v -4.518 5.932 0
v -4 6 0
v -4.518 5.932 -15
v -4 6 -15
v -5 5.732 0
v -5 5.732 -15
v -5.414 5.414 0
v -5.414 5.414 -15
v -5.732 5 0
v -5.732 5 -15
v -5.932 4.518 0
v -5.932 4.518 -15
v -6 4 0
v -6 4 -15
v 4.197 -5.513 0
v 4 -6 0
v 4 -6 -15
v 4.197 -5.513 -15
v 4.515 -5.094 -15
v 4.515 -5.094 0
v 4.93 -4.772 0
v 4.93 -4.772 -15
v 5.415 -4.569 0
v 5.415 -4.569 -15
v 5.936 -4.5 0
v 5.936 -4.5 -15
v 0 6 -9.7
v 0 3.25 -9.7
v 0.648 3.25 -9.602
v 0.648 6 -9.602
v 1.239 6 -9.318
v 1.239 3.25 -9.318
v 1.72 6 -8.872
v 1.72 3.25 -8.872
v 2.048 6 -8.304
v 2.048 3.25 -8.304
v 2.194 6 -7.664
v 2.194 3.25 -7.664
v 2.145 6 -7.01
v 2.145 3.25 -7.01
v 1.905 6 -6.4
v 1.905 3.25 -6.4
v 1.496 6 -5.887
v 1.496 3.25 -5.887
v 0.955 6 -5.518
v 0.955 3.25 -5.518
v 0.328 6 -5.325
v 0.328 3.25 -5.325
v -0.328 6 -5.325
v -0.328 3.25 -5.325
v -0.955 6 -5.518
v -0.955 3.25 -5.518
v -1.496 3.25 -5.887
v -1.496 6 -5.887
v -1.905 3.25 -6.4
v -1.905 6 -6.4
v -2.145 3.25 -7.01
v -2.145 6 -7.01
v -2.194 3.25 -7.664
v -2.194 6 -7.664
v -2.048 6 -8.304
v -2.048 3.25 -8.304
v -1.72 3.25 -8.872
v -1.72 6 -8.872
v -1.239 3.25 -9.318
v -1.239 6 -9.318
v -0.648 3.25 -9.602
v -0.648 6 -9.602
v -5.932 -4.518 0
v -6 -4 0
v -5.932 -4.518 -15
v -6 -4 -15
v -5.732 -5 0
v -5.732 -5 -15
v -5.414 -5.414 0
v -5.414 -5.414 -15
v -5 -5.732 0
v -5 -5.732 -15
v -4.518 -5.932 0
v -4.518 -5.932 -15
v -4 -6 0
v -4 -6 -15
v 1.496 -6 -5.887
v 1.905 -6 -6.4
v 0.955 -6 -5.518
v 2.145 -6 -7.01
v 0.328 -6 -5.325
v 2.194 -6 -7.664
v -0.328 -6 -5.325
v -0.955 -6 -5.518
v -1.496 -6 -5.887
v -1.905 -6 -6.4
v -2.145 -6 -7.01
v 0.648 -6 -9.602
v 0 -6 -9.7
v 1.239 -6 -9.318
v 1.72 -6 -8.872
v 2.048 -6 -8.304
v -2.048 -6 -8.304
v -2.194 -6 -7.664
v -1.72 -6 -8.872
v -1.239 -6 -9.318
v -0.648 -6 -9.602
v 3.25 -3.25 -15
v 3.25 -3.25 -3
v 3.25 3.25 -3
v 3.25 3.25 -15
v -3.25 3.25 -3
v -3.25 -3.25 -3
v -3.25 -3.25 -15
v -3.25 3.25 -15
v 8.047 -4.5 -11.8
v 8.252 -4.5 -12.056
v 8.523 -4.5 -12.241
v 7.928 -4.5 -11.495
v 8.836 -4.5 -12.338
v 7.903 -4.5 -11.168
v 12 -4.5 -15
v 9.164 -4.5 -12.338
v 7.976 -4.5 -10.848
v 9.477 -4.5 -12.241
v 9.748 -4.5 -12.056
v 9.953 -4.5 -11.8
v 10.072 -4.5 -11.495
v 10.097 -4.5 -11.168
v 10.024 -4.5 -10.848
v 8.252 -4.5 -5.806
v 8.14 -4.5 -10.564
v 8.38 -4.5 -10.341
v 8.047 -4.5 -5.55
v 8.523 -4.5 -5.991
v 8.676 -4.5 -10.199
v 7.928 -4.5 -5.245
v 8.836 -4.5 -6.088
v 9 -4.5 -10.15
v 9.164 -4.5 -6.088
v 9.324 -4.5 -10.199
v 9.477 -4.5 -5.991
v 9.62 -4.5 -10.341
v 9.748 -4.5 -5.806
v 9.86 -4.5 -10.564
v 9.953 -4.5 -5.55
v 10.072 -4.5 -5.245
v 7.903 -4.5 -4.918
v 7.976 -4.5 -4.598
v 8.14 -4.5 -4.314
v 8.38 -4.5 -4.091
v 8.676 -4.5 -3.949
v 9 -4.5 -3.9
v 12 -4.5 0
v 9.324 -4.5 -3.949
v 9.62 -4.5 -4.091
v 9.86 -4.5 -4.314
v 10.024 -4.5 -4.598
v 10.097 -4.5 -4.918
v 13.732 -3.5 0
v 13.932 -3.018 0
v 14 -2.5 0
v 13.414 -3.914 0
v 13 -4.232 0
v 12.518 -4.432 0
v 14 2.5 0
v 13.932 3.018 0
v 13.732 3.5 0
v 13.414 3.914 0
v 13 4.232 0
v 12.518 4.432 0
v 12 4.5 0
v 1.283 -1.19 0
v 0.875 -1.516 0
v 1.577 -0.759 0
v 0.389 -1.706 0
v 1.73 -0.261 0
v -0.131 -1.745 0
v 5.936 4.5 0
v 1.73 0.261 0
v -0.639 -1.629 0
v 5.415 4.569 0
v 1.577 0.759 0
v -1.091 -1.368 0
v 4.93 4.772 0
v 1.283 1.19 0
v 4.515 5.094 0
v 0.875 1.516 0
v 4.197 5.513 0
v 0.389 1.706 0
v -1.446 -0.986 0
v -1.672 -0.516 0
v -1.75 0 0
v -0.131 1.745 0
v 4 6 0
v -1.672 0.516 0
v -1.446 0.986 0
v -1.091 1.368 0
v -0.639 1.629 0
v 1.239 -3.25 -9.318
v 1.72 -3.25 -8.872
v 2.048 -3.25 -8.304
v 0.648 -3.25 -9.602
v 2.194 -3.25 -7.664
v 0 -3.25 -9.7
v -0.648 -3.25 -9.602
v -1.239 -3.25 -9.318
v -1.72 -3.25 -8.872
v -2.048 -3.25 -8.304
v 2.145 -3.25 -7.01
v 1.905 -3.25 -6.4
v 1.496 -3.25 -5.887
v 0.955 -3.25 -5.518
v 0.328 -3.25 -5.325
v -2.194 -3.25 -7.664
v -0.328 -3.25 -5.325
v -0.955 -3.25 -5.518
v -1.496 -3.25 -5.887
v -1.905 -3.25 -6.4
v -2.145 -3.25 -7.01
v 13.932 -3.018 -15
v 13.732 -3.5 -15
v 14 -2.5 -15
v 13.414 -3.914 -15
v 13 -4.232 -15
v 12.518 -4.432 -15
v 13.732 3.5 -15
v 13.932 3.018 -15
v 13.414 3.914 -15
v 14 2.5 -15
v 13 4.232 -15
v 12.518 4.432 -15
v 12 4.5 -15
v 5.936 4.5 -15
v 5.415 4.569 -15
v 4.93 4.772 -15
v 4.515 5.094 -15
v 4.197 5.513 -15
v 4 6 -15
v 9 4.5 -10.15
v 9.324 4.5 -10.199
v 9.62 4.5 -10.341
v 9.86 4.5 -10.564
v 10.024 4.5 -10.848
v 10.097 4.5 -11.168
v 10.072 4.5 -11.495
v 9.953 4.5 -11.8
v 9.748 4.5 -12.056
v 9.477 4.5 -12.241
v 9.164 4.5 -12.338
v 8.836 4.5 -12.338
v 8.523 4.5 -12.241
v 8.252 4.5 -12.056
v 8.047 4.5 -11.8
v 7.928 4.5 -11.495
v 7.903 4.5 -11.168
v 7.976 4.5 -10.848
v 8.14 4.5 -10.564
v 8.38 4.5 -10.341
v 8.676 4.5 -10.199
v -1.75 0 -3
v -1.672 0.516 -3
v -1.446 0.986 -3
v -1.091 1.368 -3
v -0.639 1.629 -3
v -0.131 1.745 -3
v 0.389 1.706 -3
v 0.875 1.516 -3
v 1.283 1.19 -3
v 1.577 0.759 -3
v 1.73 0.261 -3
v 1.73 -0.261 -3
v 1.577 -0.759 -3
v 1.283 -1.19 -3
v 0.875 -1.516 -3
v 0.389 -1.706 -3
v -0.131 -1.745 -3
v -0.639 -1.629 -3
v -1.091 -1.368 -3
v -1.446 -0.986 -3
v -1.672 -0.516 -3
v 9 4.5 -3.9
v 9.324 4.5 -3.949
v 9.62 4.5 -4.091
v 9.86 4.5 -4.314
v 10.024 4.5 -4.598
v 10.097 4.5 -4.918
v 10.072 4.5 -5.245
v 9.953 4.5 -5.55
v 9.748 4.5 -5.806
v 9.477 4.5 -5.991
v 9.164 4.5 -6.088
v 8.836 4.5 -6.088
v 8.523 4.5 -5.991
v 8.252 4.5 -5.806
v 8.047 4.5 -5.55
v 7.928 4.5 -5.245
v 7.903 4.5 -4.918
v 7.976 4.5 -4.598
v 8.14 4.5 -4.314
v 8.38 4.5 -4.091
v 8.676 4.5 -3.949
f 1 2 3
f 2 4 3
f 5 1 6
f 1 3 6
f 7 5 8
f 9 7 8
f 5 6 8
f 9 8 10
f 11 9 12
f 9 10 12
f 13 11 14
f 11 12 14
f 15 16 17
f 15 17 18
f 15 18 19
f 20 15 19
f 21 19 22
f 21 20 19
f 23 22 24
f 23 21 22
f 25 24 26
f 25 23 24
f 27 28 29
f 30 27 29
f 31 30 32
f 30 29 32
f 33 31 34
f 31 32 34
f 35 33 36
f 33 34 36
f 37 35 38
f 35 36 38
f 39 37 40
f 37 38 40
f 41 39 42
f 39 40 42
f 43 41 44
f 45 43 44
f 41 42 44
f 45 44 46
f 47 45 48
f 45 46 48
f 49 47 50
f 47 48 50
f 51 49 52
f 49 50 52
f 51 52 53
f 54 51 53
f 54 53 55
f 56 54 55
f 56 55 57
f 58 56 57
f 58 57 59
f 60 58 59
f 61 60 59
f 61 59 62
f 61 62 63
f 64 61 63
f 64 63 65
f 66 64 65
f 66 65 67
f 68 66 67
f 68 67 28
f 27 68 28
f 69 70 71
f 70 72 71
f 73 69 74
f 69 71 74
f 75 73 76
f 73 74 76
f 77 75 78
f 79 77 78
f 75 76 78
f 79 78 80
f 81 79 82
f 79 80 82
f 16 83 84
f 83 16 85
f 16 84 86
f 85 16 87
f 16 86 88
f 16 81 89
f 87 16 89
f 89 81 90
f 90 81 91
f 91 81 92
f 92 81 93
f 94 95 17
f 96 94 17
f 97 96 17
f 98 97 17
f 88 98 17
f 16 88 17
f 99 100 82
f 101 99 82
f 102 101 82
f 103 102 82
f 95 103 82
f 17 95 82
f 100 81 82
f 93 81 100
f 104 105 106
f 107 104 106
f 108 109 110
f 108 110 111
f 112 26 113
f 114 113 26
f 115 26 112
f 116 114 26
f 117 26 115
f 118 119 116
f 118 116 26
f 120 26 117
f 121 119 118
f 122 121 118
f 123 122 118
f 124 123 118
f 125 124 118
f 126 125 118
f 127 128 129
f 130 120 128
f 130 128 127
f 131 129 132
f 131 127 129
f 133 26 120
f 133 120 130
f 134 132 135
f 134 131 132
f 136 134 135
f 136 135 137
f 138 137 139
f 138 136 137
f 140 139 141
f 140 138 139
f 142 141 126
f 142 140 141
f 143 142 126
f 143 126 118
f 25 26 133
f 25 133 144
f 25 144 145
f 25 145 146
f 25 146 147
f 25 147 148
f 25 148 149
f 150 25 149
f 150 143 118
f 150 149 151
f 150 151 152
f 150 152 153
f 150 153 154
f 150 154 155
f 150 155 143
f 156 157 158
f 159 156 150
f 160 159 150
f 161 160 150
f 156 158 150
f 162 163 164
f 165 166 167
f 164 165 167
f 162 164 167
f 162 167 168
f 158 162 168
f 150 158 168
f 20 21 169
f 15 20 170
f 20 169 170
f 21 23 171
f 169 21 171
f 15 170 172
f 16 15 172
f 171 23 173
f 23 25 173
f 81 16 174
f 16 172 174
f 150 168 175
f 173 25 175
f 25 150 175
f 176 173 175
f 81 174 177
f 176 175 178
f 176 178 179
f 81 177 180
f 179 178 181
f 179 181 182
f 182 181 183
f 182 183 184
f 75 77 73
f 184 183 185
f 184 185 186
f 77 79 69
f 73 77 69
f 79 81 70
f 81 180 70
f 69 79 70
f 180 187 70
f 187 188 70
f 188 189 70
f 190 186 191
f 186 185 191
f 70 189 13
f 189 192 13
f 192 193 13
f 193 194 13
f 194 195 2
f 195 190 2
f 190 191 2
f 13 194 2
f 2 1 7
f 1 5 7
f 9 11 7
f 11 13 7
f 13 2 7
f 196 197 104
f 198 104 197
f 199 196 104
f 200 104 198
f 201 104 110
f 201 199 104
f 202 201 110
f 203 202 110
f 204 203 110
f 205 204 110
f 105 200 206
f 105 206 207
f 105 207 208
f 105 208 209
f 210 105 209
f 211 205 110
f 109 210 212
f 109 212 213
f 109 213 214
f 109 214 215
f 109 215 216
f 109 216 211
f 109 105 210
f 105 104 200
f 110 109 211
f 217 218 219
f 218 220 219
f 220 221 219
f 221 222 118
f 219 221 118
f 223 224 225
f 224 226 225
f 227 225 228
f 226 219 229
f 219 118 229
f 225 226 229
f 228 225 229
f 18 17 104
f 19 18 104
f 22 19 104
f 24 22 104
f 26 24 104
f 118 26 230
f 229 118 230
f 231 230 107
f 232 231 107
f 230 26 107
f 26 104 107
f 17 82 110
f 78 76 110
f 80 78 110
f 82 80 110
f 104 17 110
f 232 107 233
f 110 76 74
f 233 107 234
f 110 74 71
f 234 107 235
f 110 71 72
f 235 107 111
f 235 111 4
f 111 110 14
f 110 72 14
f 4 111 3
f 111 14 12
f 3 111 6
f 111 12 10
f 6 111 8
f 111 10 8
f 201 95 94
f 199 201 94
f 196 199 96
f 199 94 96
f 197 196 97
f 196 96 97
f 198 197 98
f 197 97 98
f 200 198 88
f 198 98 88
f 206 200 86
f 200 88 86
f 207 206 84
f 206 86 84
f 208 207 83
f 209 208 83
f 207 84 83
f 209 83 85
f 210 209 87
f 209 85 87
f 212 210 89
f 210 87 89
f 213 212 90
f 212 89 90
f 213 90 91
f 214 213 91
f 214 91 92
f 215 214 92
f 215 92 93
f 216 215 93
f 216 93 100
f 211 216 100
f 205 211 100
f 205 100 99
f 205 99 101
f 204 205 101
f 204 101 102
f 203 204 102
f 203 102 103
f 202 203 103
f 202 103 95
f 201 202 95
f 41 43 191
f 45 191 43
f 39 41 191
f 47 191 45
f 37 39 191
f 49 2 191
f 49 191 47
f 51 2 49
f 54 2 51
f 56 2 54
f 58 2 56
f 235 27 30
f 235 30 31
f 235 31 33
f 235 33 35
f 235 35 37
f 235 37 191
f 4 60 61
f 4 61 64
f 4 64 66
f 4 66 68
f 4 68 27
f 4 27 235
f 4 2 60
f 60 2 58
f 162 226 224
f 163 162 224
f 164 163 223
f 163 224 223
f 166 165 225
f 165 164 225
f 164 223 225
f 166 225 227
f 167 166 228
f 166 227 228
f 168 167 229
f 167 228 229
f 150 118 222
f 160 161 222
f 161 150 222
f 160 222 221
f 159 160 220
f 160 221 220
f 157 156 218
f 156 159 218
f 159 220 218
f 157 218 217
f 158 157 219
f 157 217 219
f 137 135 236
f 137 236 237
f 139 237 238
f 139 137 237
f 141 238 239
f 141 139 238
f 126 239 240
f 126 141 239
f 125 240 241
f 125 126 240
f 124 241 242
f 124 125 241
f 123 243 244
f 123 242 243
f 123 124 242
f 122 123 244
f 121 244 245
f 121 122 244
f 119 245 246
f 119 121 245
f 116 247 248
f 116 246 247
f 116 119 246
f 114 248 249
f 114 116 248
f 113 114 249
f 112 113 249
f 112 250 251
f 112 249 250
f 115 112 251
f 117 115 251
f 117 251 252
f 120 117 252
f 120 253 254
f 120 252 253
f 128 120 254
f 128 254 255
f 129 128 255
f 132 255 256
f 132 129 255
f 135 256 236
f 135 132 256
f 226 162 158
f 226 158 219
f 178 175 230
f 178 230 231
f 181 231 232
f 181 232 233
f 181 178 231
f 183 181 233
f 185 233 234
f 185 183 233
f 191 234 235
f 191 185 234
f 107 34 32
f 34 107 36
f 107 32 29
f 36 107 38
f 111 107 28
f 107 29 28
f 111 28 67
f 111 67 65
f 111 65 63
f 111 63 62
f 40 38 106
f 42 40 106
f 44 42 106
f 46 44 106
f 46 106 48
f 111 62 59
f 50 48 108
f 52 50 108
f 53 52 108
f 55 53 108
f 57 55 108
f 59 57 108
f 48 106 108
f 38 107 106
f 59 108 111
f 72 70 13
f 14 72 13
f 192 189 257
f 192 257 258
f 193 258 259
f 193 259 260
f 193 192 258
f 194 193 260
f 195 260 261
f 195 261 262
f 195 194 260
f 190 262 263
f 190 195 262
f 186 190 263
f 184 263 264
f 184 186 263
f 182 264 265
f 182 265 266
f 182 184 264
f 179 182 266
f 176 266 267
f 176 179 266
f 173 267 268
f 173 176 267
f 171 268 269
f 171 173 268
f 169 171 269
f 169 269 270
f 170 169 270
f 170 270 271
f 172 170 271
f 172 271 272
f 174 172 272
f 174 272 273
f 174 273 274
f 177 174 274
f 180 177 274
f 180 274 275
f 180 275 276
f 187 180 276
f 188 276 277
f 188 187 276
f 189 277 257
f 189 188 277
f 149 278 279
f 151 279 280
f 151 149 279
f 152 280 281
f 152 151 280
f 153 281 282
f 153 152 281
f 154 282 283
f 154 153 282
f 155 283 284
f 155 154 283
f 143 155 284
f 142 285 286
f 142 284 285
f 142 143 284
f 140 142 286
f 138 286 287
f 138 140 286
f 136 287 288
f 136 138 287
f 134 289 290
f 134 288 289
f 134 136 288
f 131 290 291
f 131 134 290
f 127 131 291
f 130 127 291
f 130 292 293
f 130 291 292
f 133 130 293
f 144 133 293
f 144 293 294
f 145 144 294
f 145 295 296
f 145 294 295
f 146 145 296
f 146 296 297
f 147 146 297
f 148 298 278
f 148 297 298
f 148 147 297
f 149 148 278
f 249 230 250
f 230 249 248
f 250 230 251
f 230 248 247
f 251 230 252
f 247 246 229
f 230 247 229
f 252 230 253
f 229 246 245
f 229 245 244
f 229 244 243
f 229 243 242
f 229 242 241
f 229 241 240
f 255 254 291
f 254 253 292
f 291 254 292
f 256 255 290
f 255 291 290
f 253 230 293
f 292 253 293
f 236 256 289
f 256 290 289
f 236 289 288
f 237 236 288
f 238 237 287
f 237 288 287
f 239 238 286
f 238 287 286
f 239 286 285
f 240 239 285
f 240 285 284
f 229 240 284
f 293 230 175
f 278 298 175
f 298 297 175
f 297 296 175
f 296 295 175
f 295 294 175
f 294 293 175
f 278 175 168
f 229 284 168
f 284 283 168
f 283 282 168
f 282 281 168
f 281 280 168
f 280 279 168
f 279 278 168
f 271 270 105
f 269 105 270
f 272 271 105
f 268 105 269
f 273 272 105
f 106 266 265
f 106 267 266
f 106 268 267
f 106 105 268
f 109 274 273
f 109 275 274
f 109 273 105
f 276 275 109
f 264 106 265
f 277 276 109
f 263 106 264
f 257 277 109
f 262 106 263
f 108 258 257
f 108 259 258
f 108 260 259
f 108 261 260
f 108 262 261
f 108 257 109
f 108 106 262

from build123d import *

# Parameters (mm, degrees)
SKETCH1_R               = 4.5
SKETCH1_R_2             = 1.25
BOSS_EXTRUDE1_DEPTH     = 8
SKETCH2_R               = 1.75
SKETCH2_R_2             = 1.25
CUT_EXTRUDE1_DEPTH      = 4
SKETCH4_W               = 12
SKETCH4_H               = 12
SKETCH4_W_2             = 6.5
SKETCH4_H_2             = 6.5
BOSS_EXTRUDE2_DEPTH     = 15
SKETCH5_W               = 15
SKETCH5_H               = 12
BOSS_EXTRUDE3_DEPTH     = 8
CUT_EXTRUDE2_DEPTH      = 24.769728648
CUT_EXTRUDE2_DEPTH_BACK = 24.769728648
SKETCH6_R               = 1.1
FILLET1_R               = 2
CUT_EXTRUDE3_START      = -1.5
SKETCH7_W               = 10
SKETCH7_H               = 15
SKETCH7_R               = 1.1
CUT_EXTRUDE3_DEPTH      = 1.5
CUT_EXTRUDE4_START      = -12
SKETCH7_2_W             = 10
SKETCH7_2_H             = 15
SKETCH7_2_R             = 1.1
CUT_EXTRUDE4_DEPTH      = 1.5
FILLET2_R               = 2
SKETCH1_2_R             = 4.5
SKETCH1_2_R_2           = 1.25
CUT_EXTRUDE5_DEPTH      = 8
BOSS_EXTRUDE5_OUTLINE_W = 6.5
BOSS_EXTRUDE5_OUTLINE_H = 6.5
BOSS_EXTRUDE5_OUTLINE_R = 1.75
BOSS_EXTRUDE5_DEPTH     = 3
SKETCH8_R               = 2.2
CUT_EXTRUDE6_DEPTH      = 14


with BuildPart() as part:
    # Sketch1 → Boss-Extrude1 (new body)
    with BuildSketch(Plane.XY):
        Circle(SKETCH1_R)
        Circle(SKETCH1_R_2, mode=Mode.SUBTRACT)
    extrude(amount=BOSS_EXTRUDE1_DEPTH)

    # Sketch2 → Cut-Extrude1 (cut)
    with BuildSketch(Plane(origin=(0, 0, 0), x_dir=(-1, 0, 0), z_dir=(0, 0, -1))):
        Circle(SKETCH2_R)
        Circle(SKETCH2_R_2, mode=Mode.SUBTRACT)
    extrude(amount=-CUT_EXTRUDE1_DEPTH, mode=Mode.SUBTRACT)

    # Sketch4 → Boss-Extrude2 (add)
    with BuildSketch(Plane(origin=(0, 0, 0), x_dir=(-1, 0, 0), z_dir=(0, 0, -1))):
        Rectangle(SKETCH4_W, SKETCH4_H)
        Rectangle(SKETCH4_W_2, SKETCH4_H_2, mode=Mode.SUBTRACT)
    extrude(amount=BOSS_EXTRUDE2_DEPTH)

    # Sketch5 → Boss-Extrude3 (add)
    with BuildSketch(Plane(origin=(6, 0, 0), x_dir=(0, 0, -1), z_dir=(1, 0, 0))):
        with Locations((7.5, 0)):
            Rectangle(SKETCH5_W, SKETCH5_H)
    extrude(amount=BOSS_EXTRUDE3_DEPTH)

    # Sketch6 → Cut-Extrude2 (cut, two sides: drawn at the far end of the back side and taken through both)
    with BuildSketch(Plane(origin=(0, 6, 0), x_dir=(1, 0, 0), z_dir=(0, 1, 0)).offset(-CUT_EXTRUDE2_DEPTH_BACK)):
        with Locations(Location((9, 11.25, 0), (0, 0, 270))):
            Circle(SKETCH6_R)
        with Locations(Location((9, 5, 0), (0, 0, 270))):
            Circle(SKETCH6_R)
    extrude(amount=CUT_EXTRUDE2_DEPTH + CUT_EXTRUDE2_DEPTH_BACK, mode=Mode.SUBTRACT)

    # Fillet1
    fillet1_edges = [part.edges().sort_by_distance(p)[0] for p in [
        (-6, -6, -7.5),
        (-6, 6, -7.5),
    ]]
    fillet(fillet1_edges, radius=FILLET1_R)

    # Sketch7 → Cut-Extrude3 (cut)
    with BuildSketch(Plane.XZ.offset(6).offset(CUT_EXTRUDE3_START)):
        with Locations((9, -7.5)):
            Rectangle(SKETCH7_W, SKETCH7_H)
        with Locations(Location((9, -5, 0), (0, 0, 270))):
            Circle(SKETCH7_R, mode=Mode.SUBTRACT)
    extrude(amount=CUT_EXTRUDE3_DEPTH, mode=Mode.SUBTRACT)

    # Sketch7<2> → Cut-Extrude4 (cut)
    with BuildSketch(Plane.XZ.offset(6).offset(CUT_EXTRUDE4_START)):
        with Locations((9, -7.5)):
            Rectangle(SKETCH7_2_W, SKETCH7_2_H)
        with Locations(Location((9, -5, 0), (0, 0, 270))):
            Circle(SKETCH7_2_R, mode=Mode.SUBTRACT)
    extrude(amount=CUT_EXTRUDE4_DEPTH, mode=Mode.SUBTRACT)

    # Fillet2
    # the kernel refuses this fillet: 2 mm, written as the material it adds along each edge
    with BuildSketch(Plane(origin=(4, 4.5, 0), x_dir=(1, 0, 0), z_dir=(0, 0, -1))) as fillet2_piece_1:
        with BuildLine():
            CenterArc((1.936491673, -2), FILLET2_R, 90, 75.522487814)
            Line((0, -1.5), (0, 0))
            Line((0, 0), (1.936491673, 0))
        make_face()
    extrude(amount=15)
    with BuildSketch(Plane(origin=(4, -4.5, 0), x_dir=(0, -1, 0), z_dir=(0, 0, -1))) as fillet2_piece_2:
        with BuildLine():
            CenterArc((2, -1.936491673), FILLET2_R, 104.477512186, 75.522487814)
            Line((0, -1.936491673), (0, 0))
            Line((0, 0), (1.5, 0))
        make_face()
    extrude(amount=15)
    # the kernel refuses this fillet: 2 mm, written as the material it takes off along each edge
    with BuildSketch(Plane(origin=(14, -4.5, -20), x_dir=(0, 1, 0), z_dir=(0, 0, 1)), Plane(origin=(14, 4.5, -20), x_dir=(-1, 0, 0), z_dir=(0, 0, 1))) as fillet2_2_piece_1:
        with BuildLine():
            CenterArc((FILLET2_R, FILLET2_R), FILLET2_R, 180, 90)
            Line((0, FILLET2_R), (0, 0))
            Line((0, 0), (FILLET2_R, 0))
        make_face()
    extrude(amount=25, mode=Mode.SUBTRACT)

    # Sketch1<2> → Cut-Extrude5 (cut)
    with BuildSketch(Plane.XY):
        Circle(SKETCH1_2_R)
        Circle(SKETCH1_2_R_2, mode=Mode.SUBTRACT)
    extrude(amount=CUT_EXTRUDE5_DEPTH, mode=Mode.SUBTRACT)

    # Boss-Extrude5: read off the stored shape, not the designer's step
    # Boss-Extrude5 outline → Boss-Extrude5 (add)
    with BuildSketch(Plane(origin=(0, 0, 0), x_dir=(-1, 0, 0), z_dir=(0, 0, -1))):
        Rectangle(BOSS_EXTRUDE5_OUTLINE_W, BOSS_EXTRUDE5_OUTLINE_H)
        Circle(BOSS_EXTRUDE5_OUTLINE_R, mode=Mode.SUBTRACT)
    extrude(amount=BOSS_EXTRUDE5_DEPTH)

    # Sketch8 → Cut-Extrude6 (cut)
    with BuildSketch(Plane.XZ.offset(6)):
        with Locations(Location((0, -7.5, 0), (0, 0, 270))):
            Circle(SKETCH8_R)
    extrude(amount=-CUT_EXTRUDE6_DEPTH, mode=Mode.SUBTRACT)


solid = part.part
